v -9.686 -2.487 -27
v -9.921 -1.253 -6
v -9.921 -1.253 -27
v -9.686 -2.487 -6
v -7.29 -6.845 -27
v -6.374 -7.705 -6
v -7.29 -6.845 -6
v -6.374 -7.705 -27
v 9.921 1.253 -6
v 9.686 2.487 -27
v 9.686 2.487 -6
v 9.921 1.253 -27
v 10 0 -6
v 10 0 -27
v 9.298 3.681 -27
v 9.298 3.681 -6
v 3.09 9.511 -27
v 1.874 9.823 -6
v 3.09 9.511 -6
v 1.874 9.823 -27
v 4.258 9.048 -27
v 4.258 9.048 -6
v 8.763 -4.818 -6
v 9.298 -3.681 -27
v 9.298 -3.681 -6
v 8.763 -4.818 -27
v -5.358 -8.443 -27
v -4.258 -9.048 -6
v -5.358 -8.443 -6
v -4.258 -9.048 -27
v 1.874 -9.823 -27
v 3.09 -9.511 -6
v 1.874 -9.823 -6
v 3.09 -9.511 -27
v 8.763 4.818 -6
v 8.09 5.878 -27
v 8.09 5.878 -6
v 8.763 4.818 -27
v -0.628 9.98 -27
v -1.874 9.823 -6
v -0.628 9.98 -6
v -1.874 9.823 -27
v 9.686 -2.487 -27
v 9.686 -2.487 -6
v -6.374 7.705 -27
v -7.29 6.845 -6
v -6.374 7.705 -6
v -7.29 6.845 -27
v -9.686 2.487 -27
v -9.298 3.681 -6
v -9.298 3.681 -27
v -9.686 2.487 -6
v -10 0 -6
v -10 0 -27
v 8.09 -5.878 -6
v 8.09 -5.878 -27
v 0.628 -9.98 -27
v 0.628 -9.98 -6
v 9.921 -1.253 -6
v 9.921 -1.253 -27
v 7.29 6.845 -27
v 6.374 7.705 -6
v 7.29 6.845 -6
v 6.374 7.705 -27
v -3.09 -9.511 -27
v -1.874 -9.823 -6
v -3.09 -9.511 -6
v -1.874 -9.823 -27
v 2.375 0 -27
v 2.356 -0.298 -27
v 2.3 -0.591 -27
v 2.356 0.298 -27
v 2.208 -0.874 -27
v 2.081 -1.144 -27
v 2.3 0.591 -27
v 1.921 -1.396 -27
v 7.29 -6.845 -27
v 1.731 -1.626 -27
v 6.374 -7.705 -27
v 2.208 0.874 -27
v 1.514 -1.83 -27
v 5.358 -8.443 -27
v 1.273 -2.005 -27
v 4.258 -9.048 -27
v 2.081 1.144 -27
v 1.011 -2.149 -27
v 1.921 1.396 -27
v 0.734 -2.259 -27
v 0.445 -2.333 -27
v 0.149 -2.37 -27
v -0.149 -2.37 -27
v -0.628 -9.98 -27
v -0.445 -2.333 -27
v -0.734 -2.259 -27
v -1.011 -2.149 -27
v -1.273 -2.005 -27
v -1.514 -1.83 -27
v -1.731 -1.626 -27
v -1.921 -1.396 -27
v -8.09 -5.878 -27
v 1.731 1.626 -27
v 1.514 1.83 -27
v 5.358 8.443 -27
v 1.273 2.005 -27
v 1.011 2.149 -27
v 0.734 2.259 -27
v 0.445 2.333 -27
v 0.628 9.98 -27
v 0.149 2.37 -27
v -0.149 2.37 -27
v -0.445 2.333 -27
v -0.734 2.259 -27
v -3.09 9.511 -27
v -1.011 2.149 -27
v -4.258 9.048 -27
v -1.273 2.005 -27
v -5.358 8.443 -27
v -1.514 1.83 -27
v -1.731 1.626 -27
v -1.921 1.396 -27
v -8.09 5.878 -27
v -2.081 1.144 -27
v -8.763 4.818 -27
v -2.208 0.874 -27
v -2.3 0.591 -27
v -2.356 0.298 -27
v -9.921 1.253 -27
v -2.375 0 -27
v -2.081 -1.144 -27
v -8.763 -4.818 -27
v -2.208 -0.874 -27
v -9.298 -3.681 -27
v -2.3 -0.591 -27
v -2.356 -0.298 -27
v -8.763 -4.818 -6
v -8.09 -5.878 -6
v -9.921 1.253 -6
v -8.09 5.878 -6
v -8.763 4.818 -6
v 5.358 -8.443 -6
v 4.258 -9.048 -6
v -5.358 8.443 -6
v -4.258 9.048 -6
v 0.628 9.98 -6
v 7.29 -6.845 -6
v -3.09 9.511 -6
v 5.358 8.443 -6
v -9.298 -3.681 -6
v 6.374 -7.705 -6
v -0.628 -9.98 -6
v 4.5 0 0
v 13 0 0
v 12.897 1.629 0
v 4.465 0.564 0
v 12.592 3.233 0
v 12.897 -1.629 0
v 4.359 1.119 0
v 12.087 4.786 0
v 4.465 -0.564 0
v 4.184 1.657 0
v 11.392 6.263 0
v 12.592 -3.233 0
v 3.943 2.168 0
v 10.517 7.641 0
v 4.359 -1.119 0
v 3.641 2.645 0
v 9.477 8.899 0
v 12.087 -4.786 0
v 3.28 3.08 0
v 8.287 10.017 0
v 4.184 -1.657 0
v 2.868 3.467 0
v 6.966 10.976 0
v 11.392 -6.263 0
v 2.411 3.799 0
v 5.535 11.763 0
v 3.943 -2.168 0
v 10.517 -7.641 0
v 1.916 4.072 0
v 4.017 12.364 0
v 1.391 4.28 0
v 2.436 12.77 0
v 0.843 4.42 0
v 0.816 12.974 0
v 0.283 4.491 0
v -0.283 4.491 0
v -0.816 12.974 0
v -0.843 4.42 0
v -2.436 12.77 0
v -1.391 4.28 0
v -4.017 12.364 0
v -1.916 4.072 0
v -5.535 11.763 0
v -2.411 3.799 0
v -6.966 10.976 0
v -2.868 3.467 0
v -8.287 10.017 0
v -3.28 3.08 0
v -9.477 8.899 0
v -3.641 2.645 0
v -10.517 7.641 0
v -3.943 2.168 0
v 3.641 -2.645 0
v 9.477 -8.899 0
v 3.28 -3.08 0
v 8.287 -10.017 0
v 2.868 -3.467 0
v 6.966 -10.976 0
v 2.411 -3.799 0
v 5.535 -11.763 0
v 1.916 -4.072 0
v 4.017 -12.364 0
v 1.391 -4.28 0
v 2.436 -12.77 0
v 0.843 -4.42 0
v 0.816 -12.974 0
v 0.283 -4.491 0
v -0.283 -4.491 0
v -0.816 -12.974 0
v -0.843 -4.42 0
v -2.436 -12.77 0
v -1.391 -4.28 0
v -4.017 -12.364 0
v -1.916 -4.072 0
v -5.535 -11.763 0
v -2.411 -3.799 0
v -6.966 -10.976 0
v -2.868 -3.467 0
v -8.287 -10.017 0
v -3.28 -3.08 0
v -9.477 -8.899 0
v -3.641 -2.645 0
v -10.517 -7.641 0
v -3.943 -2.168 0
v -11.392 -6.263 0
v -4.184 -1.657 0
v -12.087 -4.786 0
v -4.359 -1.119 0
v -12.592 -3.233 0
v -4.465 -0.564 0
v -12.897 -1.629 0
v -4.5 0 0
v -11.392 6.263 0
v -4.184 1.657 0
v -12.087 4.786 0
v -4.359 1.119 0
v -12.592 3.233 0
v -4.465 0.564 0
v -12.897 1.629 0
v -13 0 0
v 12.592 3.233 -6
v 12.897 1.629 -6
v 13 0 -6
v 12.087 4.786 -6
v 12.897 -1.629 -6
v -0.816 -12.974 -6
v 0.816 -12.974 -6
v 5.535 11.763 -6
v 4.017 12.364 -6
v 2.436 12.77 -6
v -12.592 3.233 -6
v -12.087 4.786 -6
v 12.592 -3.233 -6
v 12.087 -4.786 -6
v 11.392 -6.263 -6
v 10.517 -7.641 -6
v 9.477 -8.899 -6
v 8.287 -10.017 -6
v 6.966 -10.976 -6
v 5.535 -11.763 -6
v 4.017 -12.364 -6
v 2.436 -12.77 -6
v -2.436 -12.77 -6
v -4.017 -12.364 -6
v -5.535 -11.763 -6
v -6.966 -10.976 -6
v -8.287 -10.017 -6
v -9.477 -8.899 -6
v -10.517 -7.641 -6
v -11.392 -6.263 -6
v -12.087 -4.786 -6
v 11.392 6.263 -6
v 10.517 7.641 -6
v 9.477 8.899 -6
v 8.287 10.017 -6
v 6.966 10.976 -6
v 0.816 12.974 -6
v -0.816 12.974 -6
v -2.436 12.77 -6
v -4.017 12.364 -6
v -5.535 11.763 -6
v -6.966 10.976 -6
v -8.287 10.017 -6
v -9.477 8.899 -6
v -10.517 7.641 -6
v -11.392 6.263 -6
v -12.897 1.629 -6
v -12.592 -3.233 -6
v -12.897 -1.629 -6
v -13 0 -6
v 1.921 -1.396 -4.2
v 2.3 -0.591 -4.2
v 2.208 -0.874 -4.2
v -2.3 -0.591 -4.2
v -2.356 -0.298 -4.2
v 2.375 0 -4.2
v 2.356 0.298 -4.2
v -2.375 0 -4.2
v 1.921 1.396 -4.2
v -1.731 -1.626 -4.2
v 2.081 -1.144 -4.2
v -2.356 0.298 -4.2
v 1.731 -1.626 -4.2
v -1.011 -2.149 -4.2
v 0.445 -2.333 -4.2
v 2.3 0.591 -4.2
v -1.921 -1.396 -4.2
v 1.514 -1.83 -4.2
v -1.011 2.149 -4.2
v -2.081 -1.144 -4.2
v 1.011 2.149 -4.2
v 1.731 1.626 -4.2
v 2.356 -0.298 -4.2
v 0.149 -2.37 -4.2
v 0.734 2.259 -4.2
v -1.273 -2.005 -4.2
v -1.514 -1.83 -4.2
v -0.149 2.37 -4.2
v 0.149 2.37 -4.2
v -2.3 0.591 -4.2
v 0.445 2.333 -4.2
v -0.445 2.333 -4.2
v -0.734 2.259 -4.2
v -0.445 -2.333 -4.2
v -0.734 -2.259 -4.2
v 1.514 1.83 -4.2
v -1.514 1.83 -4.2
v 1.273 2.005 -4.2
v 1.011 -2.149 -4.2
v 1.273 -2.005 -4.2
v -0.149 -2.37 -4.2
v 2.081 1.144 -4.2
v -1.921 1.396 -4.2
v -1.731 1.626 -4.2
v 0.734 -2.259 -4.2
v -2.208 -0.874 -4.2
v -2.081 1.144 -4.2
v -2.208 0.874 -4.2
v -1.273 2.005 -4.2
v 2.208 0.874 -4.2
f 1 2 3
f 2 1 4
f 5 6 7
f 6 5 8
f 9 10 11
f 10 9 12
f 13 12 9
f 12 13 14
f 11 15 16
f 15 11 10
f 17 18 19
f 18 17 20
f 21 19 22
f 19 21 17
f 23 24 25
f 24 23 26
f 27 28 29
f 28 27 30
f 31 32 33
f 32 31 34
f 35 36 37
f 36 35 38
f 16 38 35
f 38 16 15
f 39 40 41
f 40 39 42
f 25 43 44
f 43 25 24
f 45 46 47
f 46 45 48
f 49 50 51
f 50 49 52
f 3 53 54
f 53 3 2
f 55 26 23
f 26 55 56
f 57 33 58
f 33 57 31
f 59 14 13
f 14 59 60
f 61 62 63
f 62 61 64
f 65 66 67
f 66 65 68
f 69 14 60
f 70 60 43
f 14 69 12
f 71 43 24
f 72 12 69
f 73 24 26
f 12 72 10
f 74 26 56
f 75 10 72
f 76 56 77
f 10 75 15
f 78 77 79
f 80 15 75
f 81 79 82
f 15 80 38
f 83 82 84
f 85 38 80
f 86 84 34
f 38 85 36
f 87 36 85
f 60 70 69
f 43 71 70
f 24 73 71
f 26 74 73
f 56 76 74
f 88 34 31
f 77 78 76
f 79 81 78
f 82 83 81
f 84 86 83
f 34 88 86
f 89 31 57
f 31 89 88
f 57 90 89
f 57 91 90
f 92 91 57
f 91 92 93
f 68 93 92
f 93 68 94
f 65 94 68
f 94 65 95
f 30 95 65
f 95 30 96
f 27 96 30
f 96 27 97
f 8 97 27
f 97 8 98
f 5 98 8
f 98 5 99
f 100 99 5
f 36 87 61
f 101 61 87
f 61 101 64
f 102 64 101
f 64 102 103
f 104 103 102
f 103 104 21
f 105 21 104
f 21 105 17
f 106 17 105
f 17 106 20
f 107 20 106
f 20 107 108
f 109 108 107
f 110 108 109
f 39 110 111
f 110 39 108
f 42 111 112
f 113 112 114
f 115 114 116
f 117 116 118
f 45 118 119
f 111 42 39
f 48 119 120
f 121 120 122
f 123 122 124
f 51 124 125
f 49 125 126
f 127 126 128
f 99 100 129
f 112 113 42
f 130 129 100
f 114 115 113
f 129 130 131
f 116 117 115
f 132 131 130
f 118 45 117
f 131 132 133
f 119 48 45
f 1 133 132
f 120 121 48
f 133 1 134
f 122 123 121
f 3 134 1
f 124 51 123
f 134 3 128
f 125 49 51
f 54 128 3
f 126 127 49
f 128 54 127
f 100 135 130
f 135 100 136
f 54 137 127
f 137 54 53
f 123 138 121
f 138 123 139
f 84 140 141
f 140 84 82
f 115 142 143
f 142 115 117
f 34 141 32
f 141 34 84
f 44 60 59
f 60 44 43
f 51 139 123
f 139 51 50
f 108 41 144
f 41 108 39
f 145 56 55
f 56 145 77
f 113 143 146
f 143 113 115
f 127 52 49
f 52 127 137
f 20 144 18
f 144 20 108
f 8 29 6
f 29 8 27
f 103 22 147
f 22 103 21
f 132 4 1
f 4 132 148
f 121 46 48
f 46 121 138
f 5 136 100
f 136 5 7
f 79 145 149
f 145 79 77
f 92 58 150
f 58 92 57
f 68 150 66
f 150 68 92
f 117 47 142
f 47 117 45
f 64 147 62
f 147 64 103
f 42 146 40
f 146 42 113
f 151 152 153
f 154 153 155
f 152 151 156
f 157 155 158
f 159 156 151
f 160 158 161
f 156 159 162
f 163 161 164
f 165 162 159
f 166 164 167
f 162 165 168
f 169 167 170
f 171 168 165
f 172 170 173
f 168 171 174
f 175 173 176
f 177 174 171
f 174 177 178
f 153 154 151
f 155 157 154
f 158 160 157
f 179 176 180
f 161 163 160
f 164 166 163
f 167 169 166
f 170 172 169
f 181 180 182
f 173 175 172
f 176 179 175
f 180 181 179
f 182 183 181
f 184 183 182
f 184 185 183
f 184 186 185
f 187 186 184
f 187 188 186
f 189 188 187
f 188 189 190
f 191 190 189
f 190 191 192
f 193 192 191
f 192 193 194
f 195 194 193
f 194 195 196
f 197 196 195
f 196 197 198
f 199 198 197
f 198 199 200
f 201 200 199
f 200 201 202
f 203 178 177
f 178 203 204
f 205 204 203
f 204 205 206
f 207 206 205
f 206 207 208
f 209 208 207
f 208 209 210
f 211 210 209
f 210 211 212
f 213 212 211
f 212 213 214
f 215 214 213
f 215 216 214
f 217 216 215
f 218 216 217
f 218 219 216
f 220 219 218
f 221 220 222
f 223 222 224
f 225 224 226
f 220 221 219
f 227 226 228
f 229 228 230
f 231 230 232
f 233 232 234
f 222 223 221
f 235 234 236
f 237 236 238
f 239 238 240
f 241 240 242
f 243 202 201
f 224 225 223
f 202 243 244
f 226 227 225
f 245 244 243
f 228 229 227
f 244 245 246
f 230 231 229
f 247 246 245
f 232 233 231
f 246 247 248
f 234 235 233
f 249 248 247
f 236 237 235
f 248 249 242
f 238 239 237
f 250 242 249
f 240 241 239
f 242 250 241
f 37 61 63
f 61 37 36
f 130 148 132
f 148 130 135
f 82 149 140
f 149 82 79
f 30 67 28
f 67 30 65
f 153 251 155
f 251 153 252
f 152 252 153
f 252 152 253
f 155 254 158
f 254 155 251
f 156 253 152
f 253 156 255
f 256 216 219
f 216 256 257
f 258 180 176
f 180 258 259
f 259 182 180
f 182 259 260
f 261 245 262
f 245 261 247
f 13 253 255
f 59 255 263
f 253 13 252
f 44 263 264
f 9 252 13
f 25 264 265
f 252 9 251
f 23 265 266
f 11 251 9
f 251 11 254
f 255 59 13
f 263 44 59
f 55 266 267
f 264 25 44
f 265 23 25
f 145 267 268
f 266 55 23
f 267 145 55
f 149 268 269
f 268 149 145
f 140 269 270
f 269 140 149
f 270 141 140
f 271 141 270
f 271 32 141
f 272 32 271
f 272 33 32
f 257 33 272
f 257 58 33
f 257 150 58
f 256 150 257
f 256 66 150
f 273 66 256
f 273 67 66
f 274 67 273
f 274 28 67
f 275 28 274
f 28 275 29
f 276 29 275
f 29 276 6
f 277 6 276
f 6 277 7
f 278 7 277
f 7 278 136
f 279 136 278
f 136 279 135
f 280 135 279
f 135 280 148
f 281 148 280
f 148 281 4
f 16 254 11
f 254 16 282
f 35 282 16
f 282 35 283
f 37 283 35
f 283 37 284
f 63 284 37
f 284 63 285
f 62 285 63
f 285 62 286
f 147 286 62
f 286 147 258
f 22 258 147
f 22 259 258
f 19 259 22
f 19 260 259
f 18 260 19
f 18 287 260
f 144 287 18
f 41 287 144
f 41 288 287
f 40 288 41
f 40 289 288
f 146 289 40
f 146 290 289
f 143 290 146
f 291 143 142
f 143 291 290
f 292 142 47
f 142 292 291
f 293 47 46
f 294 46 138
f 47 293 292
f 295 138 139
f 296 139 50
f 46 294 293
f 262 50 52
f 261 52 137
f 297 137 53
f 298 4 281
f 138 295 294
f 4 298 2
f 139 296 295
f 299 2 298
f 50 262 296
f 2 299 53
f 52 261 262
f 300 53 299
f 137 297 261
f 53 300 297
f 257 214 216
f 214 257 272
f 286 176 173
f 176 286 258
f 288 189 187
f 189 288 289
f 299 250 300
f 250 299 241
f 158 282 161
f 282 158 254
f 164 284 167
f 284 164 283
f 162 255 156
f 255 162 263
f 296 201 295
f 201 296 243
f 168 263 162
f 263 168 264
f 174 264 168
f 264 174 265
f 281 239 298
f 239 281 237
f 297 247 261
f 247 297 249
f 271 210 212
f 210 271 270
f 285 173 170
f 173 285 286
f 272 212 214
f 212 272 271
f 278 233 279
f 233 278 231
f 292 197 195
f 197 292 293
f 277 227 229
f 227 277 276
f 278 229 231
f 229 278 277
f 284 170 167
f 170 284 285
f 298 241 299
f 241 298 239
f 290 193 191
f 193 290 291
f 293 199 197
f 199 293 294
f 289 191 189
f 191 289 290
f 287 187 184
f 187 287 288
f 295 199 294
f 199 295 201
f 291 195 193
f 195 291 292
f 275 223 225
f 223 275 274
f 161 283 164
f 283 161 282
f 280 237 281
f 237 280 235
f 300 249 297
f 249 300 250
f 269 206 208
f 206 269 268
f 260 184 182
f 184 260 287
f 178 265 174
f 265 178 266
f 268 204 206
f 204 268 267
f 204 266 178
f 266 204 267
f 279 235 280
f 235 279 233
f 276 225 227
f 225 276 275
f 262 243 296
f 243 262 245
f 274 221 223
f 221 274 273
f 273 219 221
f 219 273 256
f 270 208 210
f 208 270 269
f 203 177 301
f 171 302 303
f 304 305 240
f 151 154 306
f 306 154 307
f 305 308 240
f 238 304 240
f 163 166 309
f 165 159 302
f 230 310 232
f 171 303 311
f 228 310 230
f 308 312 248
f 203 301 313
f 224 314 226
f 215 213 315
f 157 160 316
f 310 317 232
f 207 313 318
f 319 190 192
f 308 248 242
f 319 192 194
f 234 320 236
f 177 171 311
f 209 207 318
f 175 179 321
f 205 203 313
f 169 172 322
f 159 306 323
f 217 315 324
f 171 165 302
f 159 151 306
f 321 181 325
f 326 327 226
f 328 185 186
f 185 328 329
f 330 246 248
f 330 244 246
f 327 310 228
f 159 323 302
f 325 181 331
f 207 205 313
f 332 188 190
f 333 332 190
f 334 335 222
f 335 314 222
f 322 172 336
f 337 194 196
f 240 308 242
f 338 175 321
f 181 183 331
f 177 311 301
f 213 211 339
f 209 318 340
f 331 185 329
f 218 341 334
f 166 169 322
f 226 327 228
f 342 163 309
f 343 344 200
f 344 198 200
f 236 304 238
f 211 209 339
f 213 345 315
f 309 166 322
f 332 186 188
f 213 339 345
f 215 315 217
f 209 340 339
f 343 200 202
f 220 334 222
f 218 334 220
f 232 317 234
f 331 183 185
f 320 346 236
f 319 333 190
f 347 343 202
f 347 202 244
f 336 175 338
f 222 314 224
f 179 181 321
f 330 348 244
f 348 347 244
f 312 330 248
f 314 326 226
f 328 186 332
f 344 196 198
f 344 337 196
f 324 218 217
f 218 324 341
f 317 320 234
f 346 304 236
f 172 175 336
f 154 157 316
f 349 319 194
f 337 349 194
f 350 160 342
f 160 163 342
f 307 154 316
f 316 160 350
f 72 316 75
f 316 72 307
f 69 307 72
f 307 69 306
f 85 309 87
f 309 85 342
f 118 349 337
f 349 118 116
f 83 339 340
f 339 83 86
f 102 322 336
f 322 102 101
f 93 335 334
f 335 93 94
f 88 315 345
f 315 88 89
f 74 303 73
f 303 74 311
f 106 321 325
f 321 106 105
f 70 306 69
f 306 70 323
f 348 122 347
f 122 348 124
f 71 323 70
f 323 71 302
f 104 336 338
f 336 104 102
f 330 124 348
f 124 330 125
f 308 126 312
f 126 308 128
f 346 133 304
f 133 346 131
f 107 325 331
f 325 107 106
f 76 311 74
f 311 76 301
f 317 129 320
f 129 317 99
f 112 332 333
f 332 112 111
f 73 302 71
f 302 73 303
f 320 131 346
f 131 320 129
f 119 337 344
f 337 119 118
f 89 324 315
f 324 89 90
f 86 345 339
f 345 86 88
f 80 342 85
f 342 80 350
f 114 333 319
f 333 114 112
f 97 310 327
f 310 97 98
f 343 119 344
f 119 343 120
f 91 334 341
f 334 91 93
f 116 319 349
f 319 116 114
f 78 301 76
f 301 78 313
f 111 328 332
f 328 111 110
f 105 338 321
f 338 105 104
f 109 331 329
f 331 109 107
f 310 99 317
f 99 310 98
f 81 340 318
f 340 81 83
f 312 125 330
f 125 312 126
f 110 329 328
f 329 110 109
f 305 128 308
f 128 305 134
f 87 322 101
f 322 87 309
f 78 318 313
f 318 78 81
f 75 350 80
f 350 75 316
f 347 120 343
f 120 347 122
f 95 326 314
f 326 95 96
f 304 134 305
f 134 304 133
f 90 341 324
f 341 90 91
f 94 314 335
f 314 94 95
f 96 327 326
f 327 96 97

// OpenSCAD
$fn = 50;


difference() {
	union() {
		translate(v = [0, 0, -27.0000000000]) {
			cylinder(h = 27, r = 10.0000000000);
		}
		translate(v = [0, 0, -6.0000000000]) {
			cylinder(h = 6, r = 13.0000000000);
		}
	}
	union() {
		translate(v = [0, 0, 0]) {
			rotate(a = [0, 0, 0]) {
				difference() {
					union() {
						#translate(v = [0, 0, -27.0000000000]) {
							cylinder(h = 27, r = 2.2500000000);
						}
						#translate(v = [0, 0, -4.2000000000]) {
							cylinder(h = 4.2000000000, r = 10.0000000000, r1 = 2.3750000000, r2 = 4.5000000000);
						}
						#translate(v = [0, 0, -27.0000000000]) {
							cylinder(h = 27, r = 2.3750000000);
						}
						#translate(v = [0, 0, -27.0000000000]) {
							cylinder(h = 27, r = 2.2500000000);
						}
					}
					union();
				}
			}
		}
	}
}
